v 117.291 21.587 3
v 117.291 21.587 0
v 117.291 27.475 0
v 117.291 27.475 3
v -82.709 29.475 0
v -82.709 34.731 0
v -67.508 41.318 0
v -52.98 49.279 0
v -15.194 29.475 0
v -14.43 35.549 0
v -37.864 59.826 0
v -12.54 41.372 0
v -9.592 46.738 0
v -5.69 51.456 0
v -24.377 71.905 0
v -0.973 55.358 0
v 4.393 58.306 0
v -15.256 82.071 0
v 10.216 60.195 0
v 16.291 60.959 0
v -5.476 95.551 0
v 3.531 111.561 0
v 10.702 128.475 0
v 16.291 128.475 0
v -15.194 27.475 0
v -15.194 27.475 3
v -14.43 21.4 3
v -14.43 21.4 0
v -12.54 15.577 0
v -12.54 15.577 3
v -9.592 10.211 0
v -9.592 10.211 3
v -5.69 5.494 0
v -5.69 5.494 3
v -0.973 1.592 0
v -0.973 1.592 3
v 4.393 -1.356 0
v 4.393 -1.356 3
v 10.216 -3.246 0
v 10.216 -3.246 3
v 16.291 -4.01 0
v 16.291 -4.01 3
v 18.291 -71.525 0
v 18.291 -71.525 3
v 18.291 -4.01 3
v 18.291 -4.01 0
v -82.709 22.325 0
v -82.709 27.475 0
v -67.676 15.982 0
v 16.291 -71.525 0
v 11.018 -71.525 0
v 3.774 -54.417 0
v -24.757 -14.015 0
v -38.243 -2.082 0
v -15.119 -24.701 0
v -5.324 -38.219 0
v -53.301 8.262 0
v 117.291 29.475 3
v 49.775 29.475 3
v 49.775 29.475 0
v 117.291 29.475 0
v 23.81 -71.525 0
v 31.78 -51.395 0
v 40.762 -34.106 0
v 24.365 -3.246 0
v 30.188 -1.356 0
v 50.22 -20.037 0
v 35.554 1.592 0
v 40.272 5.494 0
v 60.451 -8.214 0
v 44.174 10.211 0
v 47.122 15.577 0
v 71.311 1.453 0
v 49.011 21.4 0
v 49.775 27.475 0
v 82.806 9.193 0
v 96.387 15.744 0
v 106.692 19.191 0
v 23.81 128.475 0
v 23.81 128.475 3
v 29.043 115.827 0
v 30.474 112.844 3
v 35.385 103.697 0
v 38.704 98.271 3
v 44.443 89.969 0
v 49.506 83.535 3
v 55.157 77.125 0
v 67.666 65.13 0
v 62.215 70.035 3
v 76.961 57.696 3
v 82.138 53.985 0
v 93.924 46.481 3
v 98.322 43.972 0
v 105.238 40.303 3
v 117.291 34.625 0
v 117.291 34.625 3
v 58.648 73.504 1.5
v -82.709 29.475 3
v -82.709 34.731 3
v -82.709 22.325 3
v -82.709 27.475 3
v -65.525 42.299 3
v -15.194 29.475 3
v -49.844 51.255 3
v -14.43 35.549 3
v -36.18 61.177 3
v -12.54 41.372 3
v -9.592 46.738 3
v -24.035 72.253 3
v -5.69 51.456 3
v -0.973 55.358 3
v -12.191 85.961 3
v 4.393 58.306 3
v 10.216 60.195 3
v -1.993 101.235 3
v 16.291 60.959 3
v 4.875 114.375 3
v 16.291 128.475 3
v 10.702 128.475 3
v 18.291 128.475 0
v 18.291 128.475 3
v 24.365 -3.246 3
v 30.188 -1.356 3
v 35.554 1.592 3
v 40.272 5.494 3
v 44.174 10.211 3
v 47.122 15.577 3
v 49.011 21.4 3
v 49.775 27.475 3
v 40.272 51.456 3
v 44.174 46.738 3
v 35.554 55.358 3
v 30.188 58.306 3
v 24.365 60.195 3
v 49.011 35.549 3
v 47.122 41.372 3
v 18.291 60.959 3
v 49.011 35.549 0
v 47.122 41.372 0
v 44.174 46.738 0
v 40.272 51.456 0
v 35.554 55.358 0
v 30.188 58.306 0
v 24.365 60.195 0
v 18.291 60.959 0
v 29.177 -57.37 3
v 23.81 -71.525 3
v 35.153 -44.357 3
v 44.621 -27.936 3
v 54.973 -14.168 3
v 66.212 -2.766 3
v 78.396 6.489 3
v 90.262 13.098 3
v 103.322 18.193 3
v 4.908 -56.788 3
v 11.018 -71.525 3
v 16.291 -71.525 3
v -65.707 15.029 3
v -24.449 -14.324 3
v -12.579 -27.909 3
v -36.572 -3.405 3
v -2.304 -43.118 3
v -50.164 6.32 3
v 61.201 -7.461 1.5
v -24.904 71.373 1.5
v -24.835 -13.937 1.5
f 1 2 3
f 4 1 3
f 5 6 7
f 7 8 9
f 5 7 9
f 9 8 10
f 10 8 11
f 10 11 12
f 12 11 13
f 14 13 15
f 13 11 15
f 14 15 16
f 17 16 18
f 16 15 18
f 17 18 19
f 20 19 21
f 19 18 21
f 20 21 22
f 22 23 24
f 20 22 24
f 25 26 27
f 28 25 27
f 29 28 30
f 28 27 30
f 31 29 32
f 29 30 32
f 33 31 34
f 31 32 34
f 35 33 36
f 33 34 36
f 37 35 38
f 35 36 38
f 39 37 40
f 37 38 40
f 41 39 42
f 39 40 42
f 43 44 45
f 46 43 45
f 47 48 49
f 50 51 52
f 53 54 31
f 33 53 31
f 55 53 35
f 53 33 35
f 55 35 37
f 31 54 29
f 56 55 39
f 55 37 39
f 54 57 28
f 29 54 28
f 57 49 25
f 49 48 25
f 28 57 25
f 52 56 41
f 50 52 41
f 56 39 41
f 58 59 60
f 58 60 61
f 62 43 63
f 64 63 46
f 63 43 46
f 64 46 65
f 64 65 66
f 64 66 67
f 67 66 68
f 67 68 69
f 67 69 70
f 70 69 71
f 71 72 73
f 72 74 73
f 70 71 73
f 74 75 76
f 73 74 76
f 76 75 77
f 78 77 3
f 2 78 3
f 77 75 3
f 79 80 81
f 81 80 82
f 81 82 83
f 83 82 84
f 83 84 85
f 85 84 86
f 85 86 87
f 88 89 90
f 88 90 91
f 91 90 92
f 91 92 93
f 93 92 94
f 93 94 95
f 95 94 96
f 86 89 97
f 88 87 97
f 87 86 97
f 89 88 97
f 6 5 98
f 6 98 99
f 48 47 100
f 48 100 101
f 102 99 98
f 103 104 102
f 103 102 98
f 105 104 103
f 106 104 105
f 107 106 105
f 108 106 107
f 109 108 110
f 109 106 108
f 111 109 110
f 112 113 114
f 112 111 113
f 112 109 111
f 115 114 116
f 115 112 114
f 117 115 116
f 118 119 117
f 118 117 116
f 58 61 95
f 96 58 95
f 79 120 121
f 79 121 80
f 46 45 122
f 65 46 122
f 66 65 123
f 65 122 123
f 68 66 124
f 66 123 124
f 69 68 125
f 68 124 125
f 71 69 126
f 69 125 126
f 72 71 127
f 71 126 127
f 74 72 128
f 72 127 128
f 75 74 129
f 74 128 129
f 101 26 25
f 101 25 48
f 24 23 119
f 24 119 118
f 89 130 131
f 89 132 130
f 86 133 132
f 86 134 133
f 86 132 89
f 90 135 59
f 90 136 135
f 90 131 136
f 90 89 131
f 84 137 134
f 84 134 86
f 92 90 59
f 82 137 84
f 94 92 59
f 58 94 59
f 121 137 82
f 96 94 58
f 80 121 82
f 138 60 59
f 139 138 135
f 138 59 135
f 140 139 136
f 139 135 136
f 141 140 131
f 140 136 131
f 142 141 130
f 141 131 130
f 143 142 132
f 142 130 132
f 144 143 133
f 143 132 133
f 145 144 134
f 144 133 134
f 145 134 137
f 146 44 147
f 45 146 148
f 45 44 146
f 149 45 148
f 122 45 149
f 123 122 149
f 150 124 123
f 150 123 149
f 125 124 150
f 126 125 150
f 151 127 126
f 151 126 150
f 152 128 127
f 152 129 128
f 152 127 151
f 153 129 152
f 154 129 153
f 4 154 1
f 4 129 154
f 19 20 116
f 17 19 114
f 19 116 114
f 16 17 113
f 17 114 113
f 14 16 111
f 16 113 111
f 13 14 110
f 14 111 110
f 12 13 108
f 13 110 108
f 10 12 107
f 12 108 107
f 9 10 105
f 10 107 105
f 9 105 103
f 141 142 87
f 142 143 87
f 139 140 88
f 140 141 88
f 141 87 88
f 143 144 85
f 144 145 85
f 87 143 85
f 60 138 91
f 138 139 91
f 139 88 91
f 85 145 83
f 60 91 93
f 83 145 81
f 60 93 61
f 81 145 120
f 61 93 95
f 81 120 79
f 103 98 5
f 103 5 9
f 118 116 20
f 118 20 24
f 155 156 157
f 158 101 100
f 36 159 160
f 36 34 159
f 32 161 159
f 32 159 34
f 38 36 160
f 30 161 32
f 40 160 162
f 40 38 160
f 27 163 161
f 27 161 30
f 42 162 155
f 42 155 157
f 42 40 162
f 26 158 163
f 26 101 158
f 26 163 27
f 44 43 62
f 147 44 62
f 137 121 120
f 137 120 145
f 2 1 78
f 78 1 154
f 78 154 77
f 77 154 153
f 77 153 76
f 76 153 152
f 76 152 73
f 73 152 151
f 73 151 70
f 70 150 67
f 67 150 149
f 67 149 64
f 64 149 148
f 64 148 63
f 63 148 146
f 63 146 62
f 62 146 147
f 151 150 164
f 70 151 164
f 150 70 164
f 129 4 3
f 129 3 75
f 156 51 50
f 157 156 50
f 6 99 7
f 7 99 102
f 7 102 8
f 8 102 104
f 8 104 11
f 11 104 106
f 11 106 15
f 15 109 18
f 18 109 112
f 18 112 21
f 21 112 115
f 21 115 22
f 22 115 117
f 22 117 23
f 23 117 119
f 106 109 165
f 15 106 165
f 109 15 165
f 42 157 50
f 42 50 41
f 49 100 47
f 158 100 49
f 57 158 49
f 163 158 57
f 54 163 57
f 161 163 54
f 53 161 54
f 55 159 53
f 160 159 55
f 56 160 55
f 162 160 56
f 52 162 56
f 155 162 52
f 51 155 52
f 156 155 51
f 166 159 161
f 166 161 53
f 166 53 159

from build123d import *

# Parameters (mm, degrees)
ESBO_O2_W                = 200
ESBO_O2_H                = 200
RESSALTO_EXTRUS_O1_DEPTH = 3
ESBO_O3_R                = 32.5
CORTE_EXTRUS_O1_DEPTH    = 10
ESBO_O4_W                = 2
ESBO_O4_H                = 77.62520767
CORTE_EXTRUS_O2_DEPTH    = 10
CORTE_EXTRUS_O3_DEPTH    = 10
CORTE_EXTRUS_O4_DEPTH    = 10
CORTE_EXTRUS_O5_DEPTH    = 10
CORTE_EXTRUS_O6_DEPTH    = 10


with BuildPart() as part:
    # Esboço2 → Ressalto-extrusão1 (new body)
    with BuildSketch(Plane.XY):
        with Locations((17.290717504, 28.474677087)):
            Rectangle(ESBO_O2_W, ESBO_O2_H)
    extrude(amount=RESSALTO_EXTRUS_O1_DEPTH)

    # Esboço3 → Corte-extrusão1 (cut)
    with BuildSketch(Plane.XY.offset(3)):
        with Locations((17.290717504, 28.474677087)):
            Circle(ESBO_O3_R)
    extrude(amount=-CORTE_EXTRUS_O1_DEPTH, mode=Mode.SUBTRACT)

    # Esboço4 → Corte-extrusão2 (cut)
    with BuildSketch(Plane.XY.offset(3)):
        Polygon((17.290717504, 53.3052203), (16.290717504, 53.3052203), (16.290717504, 128.474677087), (18.290717504, 128.474677087), (18.290717504, 53.3052203), align=None)
        Polygon((38.802998825, 29.474677087), (117.290717504, 29.474677087), (117.290717504, 27.474677087), (38.802998825, 27.474677087), (38.802998825, 28.474677087), align=None)
        with Locations((17.290717504, -32.712719078)):
            Rectangle(ESBO_O4_W, ESBO_O4_H)
        Polygon((-7.924461031, 27.474677087), (-82.709282496, 27.474677087), (-82.709282496, 28.474677087), (-82.709282496, 29.474677087), (-7.924461031, 29.474677087), align=None)
    extrude(amount=-CORTE_EXTRUS_O2_DEPTH, mode=Mode.SUBTRACT)


with BuildPart() as corte_extrus_o2_piece_1:
    # of the separate pieces the step leaves, piece 1, a body of its own (corte_extrus_o2_pieces)
    add(part.part.solids().sort_by_distance((-82.709282496, 128.474677087, 0))[0])

    # Esboço6 → Corte-extrusão4 (cut)
    with BuildSketch(Plane.XY.offset(3)):
        with BuildLine():
            Line((-82.709282496, 34.730552493), (-82.709282496, 128.474677087))
            Line((-82.709282496, 128.474677087), (10.701800736, 128.474677087))
            add(Edge.make_bspline(
                [(-82.709282496, 34.730552493), (-13.804566508, 61.143986452), (10.701800736, 128.474677087)],
                knots=[0, 0, 0, 1, 1, 1], degree=2))
        make_face()
    extrude(amount=-CORTE_EXTRUS_O4_DEPTH, mode=Mode.SUBTRACT)


with BuildPart() as corte_extrus_o2_piece_2:
    # of the separate pieces the step leaves, piece 2, a body of its own (corte_extrus_o2_pieces)
    add(part.part.solids().sort_by_distance((18.290717504, 128.474677087, 0))[0])

    # Esboço5 → Corte-extrusão3 (cut)
    with BuildSketch(Plane.XY.offset(3)):
        with BuildLine():
            Line((23.809769713, 128.474677087), (117.290717504, 128.474677087))
            Line((117.290717504, 128.474677087), (117.290717504, 34.624726341))
            add(Edge.make_bspline(
                [(23.809769713, 128.474677087), (46.745640535, 65.458889909), (117.290717504, 34.624726341)],
                knots=[0, 0, 0, 1, 1, 1], degree=2))
        make_face()
    extrude(amount=-CORTE_EXTRUS_O3_DEPTH, mode=Mode.SUBTRACT)


with BuildPart() as corte_extrus_o2_piece_3:
    # of the separate pieces the step leaves, piece 3, a body of its own (corte_extrus_o2_pieces)
    add(part.part.solids().sort_by_distance((49.775329246, 27.474677087, 0))[0])

    # Esboço7 → Corte-extrusão5 (cut)
    with BuildSketch(Plane.XY.offset(3)):
        with BuildLine():
            Line((23.809769713, -71.525322913), (117.290717504, -71.525322913))
            Line((117.290717504, -71.525322913), (117.290717504, 21.586621923))
            add(Edge.make_bspline(
                [(117.290717504, 21.586621923), (51.851674106, 10.04795298), (23.809769713, -71.525322913)],
                knots=[0, 0, 0, 1, 1, 1], degree=2))
        make_face()
    extrude(amount=-CORTE_EXTRUS_O5_DEPTH, mode=Mode.SUBTRACT)


with BuildPart() as corte_extrus_o2_piece_4:
    # of the separate pieces the step leaves, piece 4, a body of its own (corte_extrus_o2_pieces)
    add(part.part.solids().sort_by_distance((-82.709282496, -71.525322913, 0))[0])

    # Esboço8 → Corte-extrusão6 (cut)
    with BuildSketch(Plane.XY.offset(3)):
        with BuildLine():
            Line((-82.709282496, 22.324627834), (-82.709282496, -71.525322913))
            Line((-82.709282496, -71.525322913), (11.017667266, -71.525322913))
            add(Edge.make_bspline(
                [(-82.709282496, 22.324627834), (-13.824211925, -3.272820778), (11.017667266, -71.525322913)],
                knots=[0, 0, 0, 1, 1, 1], degree=2))
        make_face()
    extrude(amount=-CORTE_EXTRUS_O6_DEPTH, mode=Mode.SUBTRACT)


solid = Compound([corte_extrus_o2_piece_1.part, corte_extrus_o2_piece_2.part, corte_extrus_o2_piece_3.part, corte_extrus_o2_piece_4.part])
